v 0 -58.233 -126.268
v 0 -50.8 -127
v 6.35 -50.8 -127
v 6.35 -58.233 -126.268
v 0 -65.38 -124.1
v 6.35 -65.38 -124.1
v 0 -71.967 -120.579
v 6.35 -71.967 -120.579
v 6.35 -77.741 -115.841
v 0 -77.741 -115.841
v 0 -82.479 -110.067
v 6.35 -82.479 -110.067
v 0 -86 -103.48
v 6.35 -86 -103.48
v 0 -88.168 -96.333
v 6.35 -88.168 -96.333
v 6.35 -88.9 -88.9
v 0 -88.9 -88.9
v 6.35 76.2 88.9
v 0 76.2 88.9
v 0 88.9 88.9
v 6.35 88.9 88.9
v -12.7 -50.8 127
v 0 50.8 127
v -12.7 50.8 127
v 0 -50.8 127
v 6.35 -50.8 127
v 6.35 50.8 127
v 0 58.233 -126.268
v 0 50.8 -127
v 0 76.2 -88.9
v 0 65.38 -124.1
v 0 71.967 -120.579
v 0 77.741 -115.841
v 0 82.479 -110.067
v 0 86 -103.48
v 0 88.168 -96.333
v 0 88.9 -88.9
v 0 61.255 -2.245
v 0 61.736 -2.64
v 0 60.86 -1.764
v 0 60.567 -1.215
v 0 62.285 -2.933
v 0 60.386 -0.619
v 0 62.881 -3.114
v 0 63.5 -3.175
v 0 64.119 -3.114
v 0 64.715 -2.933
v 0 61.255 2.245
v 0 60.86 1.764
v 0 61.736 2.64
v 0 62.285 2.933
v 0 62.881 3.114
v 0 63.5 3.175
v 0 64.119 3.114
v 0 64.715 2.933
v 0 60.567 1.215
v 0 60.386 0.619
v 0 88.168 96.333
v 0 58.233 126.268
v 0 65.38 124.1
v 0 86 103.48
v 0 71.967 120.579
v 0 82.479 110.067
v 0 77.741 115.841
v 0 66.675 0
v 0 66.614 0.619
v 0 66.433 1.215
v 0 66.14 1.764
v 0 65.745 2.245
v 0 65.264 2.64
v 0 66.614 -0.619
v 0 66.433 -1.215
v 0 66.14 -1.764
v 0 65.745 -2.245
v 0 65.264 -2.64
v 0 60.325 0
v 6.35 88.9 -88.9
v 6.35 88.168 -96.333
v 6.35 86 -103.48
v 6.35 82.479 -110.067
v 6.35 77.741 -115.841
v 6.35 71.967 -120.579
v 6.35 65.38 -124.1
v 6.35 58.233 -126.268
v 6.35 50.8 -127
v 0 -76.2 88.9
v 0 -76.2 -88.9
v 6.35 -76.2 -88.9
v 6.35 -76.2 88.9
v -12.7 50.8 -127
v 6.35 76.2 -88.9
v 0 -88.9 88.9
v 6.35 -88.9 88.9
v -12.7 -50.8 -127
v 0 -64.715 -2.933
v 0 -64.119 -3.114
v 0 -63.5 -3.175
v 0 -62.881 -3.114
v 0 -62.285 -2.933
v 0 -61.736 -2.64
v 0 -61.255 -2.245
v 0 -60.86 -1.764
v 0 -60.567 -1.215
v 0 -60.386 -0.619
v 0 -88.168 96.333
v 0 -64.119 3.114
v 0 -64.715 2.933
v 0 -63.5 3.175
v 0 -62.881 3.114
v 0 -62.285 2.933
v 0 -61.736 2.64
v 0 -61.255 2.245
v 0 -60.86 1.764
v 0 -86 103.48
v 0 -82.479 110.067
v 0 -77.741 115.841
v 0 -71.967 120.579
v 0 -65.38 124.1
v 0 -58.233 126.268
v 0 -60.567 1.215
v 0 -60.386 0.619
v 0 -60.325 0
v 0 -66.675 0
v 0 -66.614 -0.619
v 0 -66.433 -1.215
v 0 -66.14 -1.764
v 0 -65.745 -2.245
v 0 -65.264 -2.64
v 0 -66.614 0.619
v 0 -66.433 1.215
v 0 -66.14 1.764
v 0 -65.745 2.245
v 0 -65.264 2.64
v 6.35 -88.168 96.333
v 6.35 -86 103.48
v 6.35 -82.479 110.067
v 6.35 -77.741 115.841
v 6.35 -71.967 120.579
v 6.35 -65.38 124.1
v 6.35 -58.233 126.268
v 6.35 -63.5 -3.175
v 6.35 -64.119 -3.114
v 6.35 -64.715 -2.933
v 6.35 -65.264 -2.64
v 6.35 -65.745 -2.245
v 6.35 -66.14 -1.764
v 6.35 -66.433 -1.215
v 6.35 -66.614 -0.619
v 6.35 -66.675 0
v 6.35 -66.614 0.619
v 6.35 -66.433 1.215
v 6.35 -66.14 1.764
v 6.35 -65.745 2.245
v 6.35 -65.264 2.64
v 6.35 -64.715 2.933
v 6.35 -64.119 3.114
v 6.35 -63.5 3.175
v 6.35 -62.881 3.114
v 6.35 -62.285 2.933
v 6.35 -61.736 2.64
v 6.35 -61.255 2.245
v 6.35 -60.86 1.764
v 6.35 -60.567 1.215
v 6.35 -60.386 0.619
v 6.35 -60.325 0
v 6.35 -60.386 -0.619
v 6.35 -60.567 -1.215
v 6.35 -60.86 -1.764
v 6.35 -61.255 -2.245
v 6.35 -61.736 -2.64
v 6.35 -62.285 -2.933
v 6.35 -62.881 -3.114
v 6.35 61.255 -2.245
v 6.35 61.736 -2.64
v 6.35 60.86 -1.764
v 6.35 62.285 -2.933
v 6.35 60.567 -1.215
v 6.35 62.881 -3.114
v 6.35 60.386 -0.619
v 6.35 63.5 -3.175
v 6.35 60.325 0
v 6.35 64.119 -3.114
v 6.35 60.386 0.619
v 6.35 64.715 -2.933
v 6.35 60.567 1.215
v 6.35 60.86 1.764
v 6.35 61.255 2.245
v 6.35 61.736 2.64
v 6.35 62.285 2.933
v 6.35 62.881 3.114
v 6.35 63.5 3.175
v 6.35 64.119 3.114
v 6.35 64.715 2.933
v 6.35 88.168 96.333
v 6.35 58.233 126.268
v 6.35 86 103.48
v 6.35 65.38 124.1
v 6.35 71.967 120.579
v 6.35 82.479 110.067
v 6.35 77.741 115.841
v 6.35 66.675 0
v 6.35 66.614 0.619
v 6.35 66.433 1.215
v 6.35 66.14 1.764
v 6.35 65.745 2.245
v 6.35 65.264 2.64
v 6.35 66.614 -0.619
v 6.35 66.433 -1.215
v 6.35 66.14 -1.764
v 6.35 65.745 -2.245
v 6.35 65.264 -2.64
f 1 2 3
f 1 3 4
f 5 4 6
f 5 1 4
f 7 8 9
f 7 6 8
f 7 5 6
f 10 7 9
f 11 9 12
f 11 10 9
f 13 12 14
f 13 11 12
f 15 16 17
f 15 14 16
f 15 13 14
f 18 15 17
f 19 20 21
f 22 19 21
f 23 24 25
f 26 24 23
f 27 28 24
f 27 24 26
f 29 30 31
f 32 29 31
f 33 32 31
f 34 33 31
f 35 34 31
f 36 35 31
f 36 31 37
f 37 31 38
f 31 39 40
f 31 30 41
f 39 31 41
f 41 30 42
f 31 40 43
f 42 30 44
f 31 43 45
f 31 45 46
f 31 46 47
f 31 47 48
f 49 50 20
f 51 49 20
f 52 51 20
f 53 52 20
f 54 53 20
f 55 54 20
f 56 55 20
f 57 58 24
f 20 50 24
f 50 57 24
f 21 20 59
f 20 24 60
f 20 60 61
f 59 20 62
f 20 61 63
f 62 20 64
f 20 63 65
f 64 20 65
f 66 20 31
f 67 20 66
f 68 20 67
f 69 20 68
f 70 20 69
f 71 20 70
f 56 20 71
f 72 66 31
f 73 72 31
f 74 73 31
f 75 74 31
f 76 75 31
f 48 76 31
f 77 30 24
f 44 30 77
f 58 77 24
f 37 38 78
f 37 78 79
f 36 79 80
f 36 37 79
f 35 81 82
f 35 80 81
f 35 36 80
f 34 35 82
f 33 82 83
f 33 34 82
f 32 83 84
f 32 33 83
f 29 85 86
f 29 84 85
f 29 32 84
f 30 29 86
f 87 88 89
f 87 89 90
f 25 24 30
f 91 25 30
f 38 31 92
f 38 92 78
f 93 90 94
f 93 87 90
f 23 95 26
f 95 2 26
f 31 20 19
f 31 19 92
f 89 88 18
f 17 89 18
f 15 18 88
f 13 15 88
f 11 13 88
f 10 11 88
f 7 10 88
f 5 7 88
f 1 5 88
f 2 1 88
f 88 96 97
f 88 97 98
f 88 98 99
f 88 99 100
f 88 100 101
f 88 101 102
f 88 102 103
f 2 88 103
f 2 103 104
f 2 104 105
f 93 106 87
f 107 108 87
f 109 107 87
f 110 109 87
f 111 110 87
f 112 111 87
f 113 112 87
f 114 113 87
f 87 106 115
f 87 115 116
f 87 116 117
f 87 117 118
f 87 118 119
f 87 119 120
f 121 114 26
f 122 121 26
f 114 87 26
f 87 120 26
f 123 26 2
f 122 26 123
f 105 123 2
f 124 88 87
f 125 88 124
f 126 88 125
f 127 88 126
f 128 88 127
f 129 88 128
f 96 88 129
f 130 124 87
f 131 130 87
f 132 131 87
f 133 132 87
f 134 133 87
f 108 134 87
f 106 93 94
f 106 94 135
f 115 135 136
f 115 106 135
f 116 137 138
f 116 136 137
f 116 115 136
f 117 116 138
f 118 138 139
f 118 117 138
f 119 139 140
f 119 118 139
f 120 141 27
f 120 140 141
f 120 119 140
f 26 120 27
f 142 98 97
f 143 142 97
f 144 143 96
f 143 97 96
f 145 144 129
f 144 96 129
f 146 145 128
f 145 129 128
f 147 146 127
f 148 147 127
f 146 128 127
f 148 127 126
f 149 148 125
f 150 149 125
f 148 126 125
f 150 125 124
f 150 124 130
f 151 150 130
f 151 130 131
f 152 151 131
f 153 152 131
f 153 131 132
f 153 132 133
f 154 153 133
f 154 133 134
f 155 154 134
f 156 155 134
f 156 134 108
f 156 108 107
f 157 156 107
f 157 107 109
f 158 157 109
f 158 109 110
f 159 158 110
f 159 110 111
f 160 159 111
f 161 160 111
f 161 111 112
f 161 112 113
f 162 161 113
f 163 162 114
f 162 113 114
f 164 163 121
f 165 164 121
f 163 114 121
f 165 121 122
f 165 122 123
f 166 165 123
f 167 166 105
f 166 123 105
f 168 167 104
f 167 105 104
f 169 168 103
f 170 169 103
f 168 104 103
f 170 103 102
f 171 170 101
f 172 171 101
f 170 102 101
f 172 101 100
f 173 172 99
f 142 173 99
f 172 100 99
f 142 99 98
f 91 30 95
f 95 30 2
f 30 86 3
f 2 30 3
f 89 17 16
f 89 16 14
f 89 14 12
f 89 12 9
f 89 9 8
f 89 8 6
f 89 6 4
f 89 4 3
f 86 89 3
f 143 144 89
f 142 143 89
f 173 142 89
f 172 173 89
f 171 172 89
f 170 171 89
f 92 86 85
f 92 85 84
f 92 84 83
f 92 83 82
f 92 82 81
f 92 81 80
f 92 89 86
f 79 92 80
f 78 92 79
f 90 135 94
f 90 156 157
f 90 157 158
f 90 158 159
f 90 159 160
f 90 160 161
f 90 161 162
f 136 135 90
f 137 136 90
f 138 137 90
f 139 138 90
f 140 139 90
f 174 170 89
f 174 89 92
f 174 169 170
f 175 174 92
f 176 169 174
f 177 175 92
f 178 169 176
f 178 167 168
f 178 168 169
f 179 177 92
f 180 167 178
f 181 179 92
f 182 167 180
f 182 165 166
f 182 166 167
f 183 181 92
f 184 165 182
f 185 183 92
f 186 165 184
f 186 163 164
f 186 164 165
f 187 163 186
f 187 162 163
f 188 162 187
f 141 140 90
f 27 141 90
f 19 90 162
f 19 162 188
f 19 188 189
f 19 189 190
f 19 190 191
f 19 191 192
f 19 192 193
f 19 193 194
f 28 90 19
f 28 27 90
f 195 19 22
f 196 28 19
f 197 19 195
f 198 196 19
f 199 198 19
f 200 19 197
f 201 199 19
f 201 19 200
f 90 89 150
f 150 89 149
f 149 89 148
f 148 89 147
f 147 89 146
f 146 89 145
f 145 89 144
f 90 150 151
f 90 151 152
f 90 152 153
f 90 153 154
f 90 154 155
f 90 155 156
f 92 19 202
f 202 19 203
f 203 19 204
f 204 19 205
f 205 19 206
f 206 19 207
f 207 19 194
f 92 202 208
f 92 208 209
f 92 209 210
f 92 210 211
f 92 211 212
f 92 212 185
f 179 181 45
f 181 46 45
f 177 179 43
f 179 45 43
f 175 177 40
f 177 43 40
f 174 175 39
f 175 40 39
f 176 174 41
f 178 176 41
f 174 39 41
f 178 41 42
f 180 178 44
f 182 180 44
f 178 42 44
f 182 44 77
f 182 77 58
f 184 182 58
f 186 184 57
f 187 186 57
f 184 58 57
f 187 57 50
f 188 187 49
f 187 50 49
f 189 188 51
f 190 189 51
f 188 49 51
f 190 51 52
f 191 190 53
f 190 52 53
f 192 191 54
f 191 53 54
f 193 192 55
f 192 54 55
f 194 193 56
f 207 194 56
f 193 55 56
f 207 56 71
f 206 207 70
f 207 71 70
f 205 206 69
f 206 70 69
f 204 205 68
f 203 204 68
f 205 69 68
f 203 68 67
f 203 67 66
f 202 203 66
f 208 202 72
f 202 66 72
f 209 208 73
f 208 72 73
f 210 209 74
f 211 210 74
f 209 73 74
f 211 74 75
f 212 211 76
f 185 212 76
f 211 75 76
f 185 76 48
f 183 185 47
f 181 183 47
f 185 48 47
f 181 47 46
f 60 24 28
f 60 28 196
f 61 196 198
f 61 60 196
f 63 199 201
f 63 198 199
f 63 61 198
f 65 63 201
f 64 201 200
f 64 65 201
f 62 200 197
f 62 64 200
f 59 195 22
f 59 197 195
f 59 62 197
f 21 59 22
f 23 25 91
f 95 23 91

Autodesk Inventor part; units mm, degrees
ref_plane "YZ Plane" through (0, 0, 0) normal (1, 0, 0) x (0, 1, 0)
ref_plane "XZ Plane" through (0, 0, 0) normal (0, 1, 0) x (-1, 0, 0)
ref_plane "XY Plane" through (0, 0, 0) normal (0, 0, 1) x (1, 0, 0)
sketch "Sketch1" plane through (0, 0, 0) normal (1, 0, 0) x (0, 1, 0)
  line L0 (-76.2, 88.9) -> (-76.2, 88.9)
  line L1 (-50.8, 127) -> (50.8, 127)
  line L2 (50.8, -127) -> (-50.8, -127)
  line L3 (-76.2, -88.9) -> (-76.2, 88.9)
  arc A0 (88.9, 88.9) -> (50.8, 127) centre (50.8, 88.9) ccw
  line L4 (76.2, 88.9) -> (88.9, 88.9)
  arc A1 (-50.8, 127) -> (-88.9, 88.9) centre (-50.8, 88.9) ccw
  line L5 (-50.8, 88.9) -> (-88.9, 88.9)
  arc A2 (50.8, -127) -> (88.9, -88.9) centre (50.8, -88.9) ccw
  line L6 (76.2, -88.9) -> (88.9, -88.9)
  line L7 (76.2, 88.9) -> (76.2, -88.9)
  arc A3 (-88.9, -88.9) -> (-50.8, -127) centre (-50.8, -88.9) ccw
  line L8 (-76.2, -88.9) -> (-88.9, -88.9)
  point P0 (0, 0)
  point P1 (-76.2, 117.2981)
  point P2 (-76.2, -117.2981)
  dimension "d62" = 254
  dimension "d64" = 76.2
  dimension "d65" = 127
  dimension "d66" = 76.2
  dimension "d72" = 76.2
  dimension "d73" = 25.4
  dimension "d74" = 76.2
  dimension "d76" = 25.4
  dimension "d77" = 76.2
  dimension "d78" = 25.4
extrude "Extrusion1" add sketch "Sketch1" along normal blind 6.35
sketch "Sketch3" plane through (6.35, 0, 0) normal (1, 0, 0) x (0, 0, -1)
  line L0 (88.9, 76.2) -> (-88.9, 76.2) projected
  line L1 (127, -50.8) -> (127, 50.8) projected
  line L2 (-88.9, -76.2) -> (88.9, -76.2) projected
  point P0 (0, 0)
  point P1 (0, -63.5)
  point P2 (0, 63.5)
  point P3 (0, 63.5)
  point P4 (127, 76.2)
  point P5 (127, -76.2)
  point P6 (-127, -76.2)
  dimension "d68" = 12.7
  dimension "d69" = 127
  dimension "d70" = 127
  dimension "d71" = 12.7
hole "Hole2" at (6.35, -63.5, 0) direction (-1, 0, 0) diameter 6.35 end through all
hole "Hole3" at (6.35, 63.5, 0) direction (-1, 0, 0) diameter 6.35 end through all
sketch "Sketch4" plane through (6.35, 0, 0) normal (1, 0, 0) x (0, 0, -1)
  line L0 (-127, 50.8) -> (-127, -50.8) projected
  line L1 (-127, 50.8) -> (127, 50.8)
  line L2 (127, 50.8) -> (127, -50.8)
  line L3 (127, -50.8) -> (-127, -50.8)
  line L4 (-127, -50.8) -> (-127, 50.8)
  point P0 (0, 0)
  point P1 (-88.9, 88.9)
  dimension "d79" = 101.6
  dimension "d80" = 38.1
extrude "Extrusion2" add sketch "Sketch4" against normal blind 19.05
sketch "Sketch5" plane through (6.35, -50.8, -127) normal (0, 0, -1) x (-1, 0, 0)
  line L0 (6.35, 0) -> (6.35, -38.1) projected
  line L1 (6.35, 101.6) -> (0, 101.6) projected
  line L2 (0, 0) -> (0, 101.6) projected
  point P0 (6.35, 50.8)
properties part number "Frame" material "ABS Plastic"
